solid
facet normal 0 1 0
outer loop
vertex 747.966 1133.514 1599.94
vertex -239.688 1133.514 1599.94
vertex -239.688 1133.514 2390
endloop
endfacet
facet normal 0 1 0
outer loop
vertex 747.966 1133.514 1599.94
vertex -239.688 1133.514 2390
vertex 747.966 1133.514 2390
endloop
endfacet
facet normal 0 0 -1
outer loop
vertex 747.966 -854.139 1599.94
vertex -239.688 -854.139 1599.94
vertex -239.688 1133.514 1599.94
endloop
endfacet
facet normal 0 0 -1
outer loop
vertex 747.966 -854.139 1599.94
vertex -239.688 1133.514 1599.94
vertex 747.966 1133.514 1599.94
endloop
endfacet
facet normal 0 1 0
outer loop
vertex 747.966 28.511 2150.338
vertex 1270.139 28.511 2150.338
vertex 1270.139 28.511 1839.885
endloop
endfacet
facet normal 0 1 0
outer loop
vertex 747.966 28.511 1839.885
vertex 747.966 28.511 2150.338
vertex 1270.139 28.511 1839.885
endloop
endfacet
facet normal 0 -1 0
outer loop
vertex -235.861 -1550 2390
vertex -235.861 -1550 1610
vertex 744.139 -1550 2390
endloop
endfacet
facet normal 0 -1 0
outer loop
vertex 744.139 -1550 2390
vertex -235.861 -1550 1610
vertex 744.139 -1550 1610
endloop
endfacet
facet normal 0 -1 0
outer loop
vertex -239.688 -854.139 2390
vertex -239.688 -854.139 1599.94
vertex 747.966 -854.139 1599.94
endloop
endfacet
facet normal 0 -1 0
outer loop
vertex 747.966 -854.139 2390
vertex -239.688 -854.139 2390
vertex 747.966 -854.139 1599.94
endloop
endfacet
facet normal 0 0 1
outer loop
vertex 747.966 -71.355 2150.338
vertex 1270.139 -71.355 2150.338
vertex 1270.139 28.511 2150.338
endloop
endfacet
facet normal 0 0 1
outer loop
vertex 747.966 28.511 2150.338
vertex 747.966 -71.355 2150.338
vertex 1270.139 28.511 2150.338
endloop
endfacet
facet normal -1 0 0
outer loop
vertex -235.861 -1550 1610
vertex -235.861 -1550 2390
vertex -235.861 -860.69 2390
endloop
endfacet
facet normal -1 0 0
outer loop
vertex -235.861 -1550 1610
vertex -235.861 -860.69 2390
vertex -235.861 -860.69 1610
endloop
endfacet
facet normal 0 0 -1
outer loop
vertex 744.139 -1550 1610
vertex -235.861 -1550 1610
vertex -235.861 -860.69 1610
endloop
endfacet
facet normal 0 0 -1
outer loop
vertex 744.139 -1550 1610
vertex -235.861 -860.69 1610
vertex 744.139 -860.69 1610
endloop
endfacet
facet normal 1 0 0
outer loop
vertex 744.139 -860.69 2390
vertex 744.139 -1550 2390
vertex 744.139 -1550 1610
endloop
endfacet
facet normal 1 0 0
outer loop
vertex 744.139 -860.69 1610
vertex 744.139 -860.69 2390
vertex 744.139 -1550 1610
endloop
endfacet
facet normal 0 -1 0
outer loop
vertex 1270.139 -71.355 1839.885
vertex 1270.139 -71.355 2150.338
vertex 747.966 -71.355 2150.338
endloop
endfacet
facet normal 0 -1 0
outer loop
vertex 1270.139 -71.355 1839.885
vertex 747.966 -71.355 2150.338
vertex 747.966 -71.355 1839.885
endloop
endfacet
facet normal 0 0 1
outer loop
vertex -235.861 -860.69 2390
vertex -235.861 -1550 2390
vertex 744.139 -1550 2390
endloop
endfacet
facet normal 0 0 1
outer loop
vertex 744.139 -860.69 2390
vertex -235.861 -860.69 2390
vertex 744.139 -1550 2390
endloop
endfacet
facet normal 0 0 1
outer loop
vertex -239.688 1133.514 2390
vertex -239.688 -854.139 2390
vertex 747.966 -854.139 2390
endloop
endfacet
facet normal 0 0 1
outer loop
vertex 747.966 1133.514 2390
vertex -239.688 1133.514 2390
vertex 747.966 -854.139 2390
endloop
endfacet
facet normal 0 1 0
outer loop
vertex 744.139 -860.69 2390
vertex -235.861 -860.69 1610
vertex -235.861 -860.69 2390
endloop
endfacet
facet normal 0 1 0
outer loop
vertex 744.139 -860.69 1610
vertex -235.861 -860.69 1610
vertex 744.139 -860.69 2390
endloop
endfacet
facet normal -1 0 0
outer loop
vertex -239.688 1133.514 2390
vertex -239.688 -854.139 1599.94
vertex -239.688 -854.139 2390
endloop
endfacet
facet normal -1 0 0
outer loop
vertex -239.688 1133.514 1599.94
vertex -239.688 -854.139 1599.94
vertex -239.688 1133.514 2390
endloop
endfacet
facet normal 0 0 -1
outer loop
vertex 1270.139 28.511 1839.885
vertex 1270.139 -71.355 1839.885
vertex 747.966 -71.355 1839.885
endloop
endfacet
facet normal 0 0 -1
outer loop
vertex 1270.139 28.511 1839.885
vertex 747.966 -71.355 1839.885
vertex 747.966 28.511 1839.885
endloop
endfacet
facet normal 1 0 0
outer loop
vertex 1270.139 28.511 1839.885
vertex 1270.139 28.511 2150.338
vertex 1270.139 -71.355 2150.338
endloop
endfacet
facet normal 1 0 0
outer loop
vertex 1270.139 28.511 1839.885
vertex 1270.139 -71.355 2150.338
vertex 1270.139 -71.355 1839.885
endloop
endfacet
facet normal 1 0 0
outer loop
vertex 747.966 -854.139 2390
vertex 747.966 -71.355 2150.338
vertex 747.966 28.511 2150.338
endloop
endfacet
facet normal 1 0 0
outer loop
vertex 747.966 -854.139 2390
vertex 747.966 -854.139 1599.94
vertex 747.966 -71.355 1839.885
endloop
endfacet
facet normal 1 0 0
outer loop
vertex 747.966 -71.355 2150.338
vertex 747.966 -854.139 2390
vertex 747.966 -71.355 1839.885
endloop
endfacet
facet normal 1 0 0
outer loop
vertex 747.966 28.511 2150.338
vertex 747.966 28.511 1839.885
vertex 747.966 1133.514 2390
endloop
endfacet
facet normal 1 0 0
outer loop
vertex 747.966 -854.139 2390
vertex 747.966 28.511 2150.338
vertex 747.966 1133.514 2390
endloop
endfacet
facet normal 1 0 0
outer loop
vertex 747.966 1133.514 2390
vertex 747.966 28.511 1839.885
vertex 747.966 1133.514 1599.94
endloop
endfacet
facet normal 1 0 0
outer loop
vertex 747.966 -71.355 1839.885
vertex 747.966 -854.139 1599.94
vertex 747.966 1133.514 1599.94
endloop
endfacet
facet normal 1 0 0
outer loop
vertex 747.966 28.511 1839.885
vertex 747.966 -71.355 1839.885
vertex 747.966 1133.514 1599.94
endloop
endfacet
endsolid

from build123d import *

# Parameters (mm, degrees)
SCHIZZO3_W                   = 980.000030518
SCHIZZO3_H                   = 780
ESTRUSIONE_ESTRUSIONE1_DEPTH = 689.31
SCHIZZO1_W                   = 987.653640747
SCHIZZO1_H                   = 1987.653686524
ESTRUSIONE_ESTRUSIONE2_DEPTH = 790.06
SCHIZZO4_W                   = 310.453109737
SCHIZZO4_H                   = 99.8660353
ESTRUSIONE_ESTRUSIONE3_DEPTH = 526


with BuildPart() as part:
    # Schizzo3 → Estrusione-Estrusione1 (new body)
    with BuildSketch(Plane(origin=(0, -1550, 0), x_dir=(1, 0, 0), z_dir=(0, 1, 0))):
        with Locations((254.138900757, -2000)):
            Rectangle(SCHIZZO3_W, SCHIZZO3_H)
    extrude(amount=ESTRUSIONE_ESTRUSIONE1_DEPTH)


with BuildPart() as body_2:
    # Schizzo1 → Estrusione-Estrusione2 (new body)
    with BuildSketch(Plane.XY.offset(1599.94)):
        with Locations((254.138877869, 139.687561035)):
            Rectangle(SCHIZZO1_W, SCHIZZO1_H)
    extrude(amount=ESTRUSIONE_ESTRUSIONE2_DEPTH)

    # Schizzo4 → Estrusione-Estrusione3 (add)
    with BuildSketch(Plane(origin=(744.138916016, 0, 0), x_dir=(0, 0, -1), z_dir=(1, 0, 0))):
        with Locations((-1995.111069738, -21.422412686)):
            Rectangle(SCHIZZO4_W, SCHIZZO4_H)
    extrude(amount=ESTRUSIONE_ESTRUSIONE3_DEPTH)


solid = Compound([part.part, body_2.part])
